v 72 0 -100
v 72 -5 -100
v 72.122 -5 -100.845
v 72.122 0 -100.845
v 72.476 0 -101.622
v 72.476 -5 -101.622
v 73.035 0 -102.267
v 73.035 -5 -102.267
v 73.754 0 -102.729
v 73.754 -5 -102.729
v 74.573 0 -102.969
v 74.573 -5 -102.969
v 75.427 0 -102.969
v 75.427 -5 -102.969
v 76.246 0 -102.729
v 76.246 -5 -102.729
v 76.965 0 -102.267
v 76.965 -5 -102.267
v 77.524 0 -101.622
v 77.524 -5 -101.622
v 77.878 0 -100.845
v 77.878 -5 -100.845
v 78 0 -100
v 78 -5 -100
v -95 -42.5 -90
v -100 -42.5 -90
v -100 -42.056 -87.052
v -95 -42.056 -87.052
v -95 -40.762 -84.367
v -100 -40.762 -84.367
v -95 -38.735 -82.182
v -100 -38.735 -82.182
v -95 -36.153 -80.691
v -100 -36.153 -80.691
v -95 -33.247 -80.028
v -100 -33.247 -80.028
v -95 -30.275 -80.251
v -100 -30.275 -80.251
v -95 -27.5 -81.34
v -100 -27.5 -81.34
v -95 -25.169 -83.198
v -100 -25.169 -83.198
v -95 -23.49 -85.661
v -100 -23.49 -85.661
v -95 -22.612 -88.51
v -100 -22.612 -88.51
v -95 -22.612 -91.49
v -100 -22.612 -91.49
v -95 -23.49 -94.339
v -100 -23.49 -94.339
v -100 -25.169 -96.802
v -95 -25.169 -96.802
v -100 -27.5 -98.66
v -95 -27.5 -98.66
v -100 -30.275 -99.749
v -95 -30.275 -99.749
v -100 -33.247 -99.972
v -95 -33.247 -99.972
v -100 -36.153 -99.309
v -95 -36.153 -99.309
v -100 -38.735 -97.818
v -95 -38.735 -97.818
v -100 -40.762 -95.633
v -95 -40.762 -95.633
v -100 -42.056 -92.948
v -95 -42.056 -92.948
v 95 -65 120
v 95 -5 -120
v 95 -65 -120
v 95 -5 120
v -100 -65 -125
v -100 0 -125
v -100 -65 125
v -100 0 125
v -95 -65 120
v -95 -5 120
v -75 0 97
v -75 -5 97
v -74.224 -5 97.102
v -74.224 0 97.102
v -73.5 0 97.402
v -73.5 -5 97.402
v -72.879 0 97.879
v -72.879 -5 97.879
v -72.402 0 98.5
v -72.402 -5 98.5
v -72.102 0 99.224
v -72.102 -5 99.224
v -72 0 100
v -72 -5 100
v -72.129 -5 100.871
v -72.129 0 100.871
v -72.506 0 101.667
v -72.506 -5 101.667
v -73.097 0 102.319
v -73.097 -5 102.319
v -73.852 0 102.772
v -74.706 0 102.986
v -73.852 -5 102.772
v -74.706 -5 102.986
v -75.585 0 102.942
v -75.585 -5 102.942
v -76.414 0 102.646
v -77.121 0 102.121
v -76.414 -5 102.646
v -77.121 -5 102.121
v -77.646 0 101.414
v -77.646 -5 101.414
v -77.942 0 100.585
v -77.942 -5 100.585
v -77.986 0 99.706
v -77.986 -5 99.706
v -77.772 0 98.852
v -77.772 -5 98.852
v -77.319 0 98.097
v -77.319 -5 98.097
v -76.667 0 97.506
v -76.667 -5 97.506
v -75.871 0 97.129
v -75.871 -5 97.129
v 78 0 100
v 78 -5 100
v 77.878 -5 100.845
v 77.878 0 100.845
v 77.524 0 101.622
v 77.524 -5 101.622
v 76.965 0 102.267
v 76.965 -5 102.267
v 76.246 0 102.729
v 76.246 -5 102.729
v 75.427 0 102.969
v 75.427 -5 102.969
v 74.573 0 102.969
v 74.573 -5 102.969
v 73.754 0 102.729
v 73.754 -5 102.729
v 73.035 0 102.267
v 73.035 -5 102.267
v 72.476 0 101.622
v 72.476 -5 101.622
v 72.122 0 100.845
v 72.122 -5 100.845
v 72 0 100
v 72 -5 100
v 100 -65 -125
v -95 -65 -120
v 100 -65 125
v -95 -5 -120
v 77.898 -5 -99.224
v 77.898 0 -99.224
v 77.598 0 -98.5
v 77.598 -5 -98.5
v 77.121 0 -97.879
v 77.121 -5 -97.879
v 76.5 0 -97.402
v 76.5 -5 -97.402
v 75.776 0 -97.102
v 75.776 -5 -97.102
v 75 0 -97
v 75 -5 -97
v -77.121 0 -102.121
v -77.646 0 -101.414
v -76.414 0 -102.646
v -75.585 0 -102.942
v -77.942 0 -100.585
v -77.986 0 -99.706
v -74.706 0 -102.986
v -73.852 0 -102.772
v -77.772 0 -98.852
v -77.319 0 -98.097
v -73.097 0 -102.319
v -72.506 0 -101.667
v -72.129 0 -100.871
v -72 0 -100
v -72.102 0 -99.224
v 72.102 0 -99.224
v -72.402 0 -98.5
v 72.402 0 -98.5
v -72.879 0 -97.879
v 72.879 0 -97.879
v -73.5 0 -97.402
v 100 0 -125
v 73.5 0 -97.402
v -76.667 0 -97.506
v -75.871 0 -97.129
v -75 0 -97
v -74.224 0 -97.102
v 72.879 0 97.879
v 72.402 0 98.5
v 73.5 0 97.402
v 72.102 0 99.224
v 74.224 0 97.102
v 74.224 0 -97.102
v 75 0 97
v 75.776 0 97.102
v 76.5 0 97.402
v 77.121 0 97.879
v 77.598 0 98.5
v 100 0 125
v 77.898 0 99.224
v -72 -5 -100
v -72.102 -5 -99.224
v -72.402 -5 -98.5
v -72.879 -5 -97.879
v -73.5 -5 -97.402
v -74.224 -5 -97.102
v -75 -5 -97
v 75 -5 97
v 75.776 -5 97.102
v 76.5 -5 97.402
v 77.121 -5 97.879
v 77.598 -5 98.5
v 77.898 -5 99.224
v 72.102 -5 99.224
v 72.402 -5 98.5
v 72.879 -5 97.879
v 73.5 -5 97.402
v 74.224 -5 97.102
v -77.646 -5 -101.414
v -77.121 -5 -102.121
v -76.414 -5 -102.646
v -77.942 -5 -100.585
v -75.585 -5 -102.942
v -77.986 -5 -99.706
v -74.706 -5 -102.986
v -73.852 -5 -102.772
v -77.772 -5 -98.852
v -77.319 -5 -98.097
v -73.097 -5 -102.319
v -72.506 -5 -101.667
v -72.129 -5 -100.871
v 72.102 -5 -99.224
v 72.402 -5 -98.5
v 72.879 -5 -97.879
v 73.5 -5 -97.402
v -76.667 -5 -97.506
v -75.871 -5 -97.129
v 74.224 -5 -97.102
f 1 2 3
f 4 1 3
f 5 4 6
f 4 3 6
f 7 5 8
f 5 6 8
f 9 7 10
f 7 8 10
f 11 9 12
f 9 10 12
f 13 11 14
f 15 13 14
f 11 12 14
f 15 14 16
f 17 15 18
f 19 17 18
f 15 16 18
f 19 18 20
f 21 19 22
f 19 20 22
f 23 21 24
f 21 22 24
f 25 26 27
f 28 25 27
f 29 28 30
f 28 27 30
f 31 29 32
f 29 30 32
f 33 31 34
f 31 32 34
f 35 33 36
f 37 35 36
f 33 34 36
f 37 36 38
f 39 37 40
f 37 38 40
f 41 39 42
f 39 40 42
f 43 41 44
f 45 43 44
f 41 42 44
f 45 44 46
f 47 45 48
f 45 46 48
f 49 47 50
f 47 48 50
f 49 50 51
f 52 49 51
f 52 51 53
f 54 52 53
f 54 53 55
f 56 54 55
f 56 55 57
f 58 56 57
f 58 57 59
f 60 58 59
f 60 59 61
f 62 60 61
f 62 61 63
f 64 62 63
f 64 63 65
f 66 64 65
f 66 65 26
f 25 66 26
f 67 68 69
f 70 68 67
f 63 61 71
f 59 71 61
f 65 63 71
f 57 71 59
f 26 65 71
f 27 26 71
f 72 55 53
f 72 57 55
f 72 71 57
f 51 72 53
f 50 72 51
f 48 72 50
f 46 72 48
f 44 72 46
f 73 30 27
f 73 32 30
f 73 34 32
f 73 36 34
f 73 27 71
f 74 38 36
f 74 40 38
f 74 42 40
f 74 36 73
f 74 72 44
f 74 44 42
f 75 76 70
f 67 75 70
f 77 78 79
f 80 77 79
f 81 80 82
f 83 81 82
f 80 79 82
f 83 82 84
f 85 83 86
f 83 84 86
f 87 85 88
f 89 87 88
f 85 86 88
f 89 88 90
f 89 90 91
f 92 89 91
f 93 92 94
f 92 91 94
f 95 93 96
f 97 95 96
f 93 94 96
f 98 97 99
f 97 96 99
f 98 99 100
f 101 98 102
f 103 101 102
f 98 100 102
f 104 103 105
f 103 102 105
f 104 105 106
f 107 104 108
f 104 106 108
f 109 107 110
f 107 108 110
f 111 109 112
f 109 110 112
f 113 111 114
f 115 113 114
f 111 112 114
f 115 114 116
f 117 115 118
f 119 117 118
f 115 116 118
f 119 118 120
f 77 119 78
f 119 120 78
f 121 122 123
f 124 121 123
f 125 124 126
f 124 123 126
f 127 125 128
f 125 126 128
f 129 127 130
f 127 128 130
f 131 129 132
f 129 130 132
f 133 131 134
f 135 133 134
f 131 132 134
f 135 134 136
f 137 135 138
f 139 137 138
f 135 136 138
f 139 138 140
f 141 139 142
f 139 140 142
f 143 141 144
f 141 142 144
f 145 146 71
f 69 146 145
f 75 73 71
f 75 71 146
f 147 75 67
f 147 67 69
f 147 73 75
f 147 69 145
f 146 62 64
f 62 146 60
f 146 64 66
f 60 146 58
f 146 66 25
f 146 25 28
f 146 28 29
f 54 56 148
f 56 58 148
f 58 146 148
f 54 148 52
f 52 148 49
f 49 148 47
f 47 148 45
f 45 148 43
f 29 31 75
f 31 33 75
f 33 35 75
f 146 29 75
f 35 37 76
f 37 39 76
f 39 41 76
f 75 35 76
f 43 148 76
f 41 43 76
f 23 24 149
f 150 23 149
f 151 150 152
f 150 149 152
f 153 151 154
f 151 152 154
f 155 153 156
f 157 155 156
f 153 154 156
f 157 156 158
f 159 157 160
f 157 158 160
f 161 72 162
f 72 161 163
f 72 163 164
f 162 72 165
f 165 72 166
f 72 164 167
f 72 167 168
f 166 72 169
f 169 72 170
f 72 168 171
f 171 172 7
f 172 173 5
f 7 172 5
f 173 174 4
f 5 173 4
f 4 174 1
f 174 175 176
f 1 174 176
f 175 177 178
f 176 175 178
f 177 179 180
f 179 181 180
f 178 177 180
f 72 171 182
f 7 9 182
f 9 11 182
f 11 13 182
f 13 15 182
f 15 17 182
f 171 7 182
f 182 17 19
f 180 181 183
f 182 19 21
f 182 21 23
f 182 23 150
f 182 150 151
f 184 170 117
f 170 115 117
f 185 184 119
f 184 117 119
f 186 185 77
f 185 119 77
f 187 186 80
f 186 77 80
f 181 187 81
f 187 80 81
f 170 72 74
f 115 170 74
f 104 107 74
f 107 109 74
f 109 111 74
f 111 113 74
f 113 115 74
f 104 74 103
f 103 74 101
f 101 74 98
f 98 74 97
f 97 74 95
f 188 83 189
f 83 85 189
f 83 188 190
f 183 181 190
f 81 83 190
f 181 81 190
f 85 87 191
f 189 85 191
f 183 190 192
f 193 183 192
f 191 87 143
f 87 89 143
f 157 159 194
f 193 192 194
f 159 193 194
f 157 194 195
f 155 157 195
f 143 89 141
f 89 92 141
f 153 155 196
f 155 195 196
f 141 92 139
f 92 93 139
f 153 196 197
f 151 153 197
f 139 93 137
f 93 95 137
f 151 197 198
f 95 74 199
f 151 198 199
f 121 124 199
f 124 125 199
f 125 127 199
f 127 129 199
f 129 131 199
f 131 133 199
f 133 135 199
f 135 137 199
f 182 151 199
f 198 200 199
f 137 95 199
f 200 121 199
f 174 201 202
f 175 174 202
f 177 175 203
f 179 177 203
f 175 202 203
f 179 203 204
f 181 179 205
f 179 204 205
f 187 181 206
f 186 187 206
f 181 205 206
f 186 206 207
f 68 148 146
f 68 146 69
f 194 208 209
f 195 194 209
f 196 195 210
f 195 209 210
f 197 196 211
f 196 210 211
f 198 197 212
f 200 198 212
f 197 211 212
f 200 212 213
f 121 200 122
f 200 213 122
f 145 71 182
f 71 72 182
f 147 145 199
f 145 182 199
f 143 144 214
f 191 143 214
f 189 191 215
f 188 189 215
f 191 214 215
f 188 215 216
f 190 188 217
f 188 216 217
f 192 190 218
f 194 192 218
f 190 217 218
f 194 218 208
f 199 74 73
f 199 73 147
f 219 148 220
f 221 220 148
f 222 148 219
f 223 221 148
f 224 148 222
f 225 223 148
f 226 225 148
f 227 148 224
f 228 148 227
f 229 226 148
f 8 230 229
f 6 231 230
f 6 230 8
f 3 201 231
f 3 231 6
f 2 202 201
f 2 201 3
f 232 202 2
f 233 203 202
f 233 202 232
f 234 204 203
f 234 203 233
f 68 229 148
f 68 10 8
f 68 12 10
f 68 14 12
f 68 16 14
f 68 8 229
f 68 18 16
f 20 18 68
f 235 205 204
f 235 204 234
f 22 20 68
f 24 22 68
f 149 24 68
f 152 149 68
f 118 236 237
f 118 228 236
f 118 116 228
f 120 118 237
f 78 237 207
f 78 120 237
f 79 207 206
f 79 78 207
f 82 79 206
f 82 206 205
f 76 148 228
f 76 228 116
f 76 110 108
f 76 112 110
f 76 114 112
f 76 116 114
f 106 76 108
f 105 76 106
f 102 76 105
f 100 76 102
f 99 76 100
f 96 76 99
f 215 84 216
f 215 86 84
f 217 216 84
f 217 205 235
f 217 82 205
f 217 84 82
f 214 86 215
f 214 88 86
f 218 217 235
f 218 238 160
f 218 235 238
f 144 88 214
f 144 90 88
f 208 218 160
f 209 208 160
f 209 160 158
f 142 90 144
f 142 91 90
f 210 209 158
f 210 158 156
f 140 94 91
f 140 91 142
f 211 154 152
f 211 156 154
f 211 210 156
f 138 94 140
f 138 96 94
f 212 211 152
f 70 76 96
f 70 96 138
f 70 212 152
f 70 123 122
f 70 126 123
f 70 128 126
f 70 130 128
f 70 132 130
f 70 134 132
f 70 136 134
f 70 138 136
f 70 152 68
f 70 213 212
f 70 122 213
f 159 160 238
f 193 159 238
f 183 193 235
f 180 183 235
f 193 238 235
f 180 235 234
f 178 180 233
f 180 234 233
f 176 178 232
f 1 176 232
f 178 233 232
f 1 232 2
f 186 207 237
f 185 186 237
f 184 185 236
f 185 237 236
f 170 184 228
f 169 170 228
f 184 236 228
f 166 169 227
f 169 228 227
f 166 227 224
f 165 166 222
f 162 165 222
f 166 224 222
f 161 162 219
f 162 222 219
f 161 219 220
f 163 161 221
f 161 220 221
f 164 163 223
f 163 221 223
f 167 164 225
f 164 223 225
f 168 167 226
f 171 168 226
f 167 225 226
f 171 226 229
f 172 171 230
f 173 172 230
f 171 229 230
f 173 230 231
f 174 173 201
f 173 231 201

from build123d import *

# Parameters (mm, degrees)
F0_W     = 200
F0_H     = 250
F1_DEPTH = 5
F2_W     = 200
F2_H     = 250
F2_W_2   = 189.999994
F2_H_2   = 239.999994
F3_DEPTH = 60
F5_DEPTH = 5.001
F6_R     = 10
F7_DEPTH = 25


with BuildPart() as f1:
    # F0 (on Front) → F1 (new body)
    with BuildSketch(Plane.XZ):
        Rectangle(F0_W, F0_H)
    extrude(amount=F1_DEPTH)

    # F2 (on face) → F3 (join)
    with BuildSketch(Plane.XZ.offset(5)):
        Rectangle(F2_W, F2_H)
        Rectangle(F2_W_2, F2_H_2, mode=Mode.SUBTRACT)
    extrude(amount=F3_DEPTH)

    # F4 (on face) → F5 (cut, through all)
    with BuildSketch(Plane.XZ.offset(5)):
        with BuildLine():
            ThreePointArc((-74.999997, 96.999997), (-72.878677, 97.878677), (-71.999997, 99.999997))
            Line((-71.999997, 99.999997), (-74.999997, 99.999997))
            Line((-74.999997, 99.999997), (-74.999997, 96.999997))
        make_face()
        with BuildLine():
            Line((-74.999997, 99.999997), (-71.999997, 99.999997))
            ThreePointArc((-71.999997, 99.999997), (-77.121318, 102.121318), (-74.999997, 96.999997))
            Line((-74.999997, 96.999997), (-74.999997, 99.999997))
        make_face()
        with BuildLine():
            ThreePointArc((77.999997, 99.999997), (74.999997, 102.999997), (71.999997, 99.999997))
            Line((71.999997, 99.999997), (74.999997, 99.999997))
            Line((74.999997, 99.999997), (74.999997, 96.999997))
            ThreePointArc((74.999997, 96.999997), (77.121318, 97.878677), (77.999997, 99.999997))
        make_face()
        with BuildLine():
            Line((74.999997, 99.999997), (71.999997, 99.999997))
            ThreePointArc((71.999997, 99.999997), (72.878677, 97.878677), (74.999997, 96.999997))
            Line((74.999997, 96.999997), (74.999997, 99.999997))
        make_face()
        with BuildLine():
            ThreePointArc((77.999997, -99.999997), (77.121318, -97.878677), (74.999997, -96.999997))
            Line((74.999997, -96.999997), (74.999997, -99.999997))
            Line((74.999997, -99.999997), (71.999997, -99.999997))
            ThreePointArc((71.999997, -99.999997), (74.999997, -102.999997), (77.999997, -99.999997))
        make_face()
        with BuildLine():
            Line((74.999997, -99.999997), (74.999997, -96.999997))
            ThreePointArc((74.999997, -96.999997), (72.878677, -97.878677), (71.999997, -99.999997))
            Line((71.999997, -99.999997), (74.999997, -99.999997))
        make_face()
        with BuildLine():
            Line((-74.999997, -99.999997), (-74.999997, -96.999997))
            ThreePointArc((-74.999997, -96.999997), (-77.121318, -102.121318), (-71.999997, -99.999997))
            Line((-71.999997, -99.999997), (-74.999997, -99.999997))
        make_face()
        with BuildLine():
            ThreePointArc((-71.999997, -99.999997), (-72.878677, -97.878677), (-74.999997, -96.999997))
            Line((-74.999997, -96.999997), (-74.999997, -99.999997))
            Line((-74.999997, -99.999997), (-71.999997, -99.999997))
        make_face()
    extrude(amount=-F5_DEPTH, mode=Mode.SUBTRACT)

    # F6 (on face) → F7 (cut)
    with BuildSketch(Plane(origin=(-100, 0, 0), x_dir=(0, -1, 0), z_dir=(-1, 0, 0))):
        with Locations((32.5, -90)):
            Circle(F6_R)
    extrude(amount=-F7_DEPTH, mode=Mode.SUBTRACT)


solid = f1.part
